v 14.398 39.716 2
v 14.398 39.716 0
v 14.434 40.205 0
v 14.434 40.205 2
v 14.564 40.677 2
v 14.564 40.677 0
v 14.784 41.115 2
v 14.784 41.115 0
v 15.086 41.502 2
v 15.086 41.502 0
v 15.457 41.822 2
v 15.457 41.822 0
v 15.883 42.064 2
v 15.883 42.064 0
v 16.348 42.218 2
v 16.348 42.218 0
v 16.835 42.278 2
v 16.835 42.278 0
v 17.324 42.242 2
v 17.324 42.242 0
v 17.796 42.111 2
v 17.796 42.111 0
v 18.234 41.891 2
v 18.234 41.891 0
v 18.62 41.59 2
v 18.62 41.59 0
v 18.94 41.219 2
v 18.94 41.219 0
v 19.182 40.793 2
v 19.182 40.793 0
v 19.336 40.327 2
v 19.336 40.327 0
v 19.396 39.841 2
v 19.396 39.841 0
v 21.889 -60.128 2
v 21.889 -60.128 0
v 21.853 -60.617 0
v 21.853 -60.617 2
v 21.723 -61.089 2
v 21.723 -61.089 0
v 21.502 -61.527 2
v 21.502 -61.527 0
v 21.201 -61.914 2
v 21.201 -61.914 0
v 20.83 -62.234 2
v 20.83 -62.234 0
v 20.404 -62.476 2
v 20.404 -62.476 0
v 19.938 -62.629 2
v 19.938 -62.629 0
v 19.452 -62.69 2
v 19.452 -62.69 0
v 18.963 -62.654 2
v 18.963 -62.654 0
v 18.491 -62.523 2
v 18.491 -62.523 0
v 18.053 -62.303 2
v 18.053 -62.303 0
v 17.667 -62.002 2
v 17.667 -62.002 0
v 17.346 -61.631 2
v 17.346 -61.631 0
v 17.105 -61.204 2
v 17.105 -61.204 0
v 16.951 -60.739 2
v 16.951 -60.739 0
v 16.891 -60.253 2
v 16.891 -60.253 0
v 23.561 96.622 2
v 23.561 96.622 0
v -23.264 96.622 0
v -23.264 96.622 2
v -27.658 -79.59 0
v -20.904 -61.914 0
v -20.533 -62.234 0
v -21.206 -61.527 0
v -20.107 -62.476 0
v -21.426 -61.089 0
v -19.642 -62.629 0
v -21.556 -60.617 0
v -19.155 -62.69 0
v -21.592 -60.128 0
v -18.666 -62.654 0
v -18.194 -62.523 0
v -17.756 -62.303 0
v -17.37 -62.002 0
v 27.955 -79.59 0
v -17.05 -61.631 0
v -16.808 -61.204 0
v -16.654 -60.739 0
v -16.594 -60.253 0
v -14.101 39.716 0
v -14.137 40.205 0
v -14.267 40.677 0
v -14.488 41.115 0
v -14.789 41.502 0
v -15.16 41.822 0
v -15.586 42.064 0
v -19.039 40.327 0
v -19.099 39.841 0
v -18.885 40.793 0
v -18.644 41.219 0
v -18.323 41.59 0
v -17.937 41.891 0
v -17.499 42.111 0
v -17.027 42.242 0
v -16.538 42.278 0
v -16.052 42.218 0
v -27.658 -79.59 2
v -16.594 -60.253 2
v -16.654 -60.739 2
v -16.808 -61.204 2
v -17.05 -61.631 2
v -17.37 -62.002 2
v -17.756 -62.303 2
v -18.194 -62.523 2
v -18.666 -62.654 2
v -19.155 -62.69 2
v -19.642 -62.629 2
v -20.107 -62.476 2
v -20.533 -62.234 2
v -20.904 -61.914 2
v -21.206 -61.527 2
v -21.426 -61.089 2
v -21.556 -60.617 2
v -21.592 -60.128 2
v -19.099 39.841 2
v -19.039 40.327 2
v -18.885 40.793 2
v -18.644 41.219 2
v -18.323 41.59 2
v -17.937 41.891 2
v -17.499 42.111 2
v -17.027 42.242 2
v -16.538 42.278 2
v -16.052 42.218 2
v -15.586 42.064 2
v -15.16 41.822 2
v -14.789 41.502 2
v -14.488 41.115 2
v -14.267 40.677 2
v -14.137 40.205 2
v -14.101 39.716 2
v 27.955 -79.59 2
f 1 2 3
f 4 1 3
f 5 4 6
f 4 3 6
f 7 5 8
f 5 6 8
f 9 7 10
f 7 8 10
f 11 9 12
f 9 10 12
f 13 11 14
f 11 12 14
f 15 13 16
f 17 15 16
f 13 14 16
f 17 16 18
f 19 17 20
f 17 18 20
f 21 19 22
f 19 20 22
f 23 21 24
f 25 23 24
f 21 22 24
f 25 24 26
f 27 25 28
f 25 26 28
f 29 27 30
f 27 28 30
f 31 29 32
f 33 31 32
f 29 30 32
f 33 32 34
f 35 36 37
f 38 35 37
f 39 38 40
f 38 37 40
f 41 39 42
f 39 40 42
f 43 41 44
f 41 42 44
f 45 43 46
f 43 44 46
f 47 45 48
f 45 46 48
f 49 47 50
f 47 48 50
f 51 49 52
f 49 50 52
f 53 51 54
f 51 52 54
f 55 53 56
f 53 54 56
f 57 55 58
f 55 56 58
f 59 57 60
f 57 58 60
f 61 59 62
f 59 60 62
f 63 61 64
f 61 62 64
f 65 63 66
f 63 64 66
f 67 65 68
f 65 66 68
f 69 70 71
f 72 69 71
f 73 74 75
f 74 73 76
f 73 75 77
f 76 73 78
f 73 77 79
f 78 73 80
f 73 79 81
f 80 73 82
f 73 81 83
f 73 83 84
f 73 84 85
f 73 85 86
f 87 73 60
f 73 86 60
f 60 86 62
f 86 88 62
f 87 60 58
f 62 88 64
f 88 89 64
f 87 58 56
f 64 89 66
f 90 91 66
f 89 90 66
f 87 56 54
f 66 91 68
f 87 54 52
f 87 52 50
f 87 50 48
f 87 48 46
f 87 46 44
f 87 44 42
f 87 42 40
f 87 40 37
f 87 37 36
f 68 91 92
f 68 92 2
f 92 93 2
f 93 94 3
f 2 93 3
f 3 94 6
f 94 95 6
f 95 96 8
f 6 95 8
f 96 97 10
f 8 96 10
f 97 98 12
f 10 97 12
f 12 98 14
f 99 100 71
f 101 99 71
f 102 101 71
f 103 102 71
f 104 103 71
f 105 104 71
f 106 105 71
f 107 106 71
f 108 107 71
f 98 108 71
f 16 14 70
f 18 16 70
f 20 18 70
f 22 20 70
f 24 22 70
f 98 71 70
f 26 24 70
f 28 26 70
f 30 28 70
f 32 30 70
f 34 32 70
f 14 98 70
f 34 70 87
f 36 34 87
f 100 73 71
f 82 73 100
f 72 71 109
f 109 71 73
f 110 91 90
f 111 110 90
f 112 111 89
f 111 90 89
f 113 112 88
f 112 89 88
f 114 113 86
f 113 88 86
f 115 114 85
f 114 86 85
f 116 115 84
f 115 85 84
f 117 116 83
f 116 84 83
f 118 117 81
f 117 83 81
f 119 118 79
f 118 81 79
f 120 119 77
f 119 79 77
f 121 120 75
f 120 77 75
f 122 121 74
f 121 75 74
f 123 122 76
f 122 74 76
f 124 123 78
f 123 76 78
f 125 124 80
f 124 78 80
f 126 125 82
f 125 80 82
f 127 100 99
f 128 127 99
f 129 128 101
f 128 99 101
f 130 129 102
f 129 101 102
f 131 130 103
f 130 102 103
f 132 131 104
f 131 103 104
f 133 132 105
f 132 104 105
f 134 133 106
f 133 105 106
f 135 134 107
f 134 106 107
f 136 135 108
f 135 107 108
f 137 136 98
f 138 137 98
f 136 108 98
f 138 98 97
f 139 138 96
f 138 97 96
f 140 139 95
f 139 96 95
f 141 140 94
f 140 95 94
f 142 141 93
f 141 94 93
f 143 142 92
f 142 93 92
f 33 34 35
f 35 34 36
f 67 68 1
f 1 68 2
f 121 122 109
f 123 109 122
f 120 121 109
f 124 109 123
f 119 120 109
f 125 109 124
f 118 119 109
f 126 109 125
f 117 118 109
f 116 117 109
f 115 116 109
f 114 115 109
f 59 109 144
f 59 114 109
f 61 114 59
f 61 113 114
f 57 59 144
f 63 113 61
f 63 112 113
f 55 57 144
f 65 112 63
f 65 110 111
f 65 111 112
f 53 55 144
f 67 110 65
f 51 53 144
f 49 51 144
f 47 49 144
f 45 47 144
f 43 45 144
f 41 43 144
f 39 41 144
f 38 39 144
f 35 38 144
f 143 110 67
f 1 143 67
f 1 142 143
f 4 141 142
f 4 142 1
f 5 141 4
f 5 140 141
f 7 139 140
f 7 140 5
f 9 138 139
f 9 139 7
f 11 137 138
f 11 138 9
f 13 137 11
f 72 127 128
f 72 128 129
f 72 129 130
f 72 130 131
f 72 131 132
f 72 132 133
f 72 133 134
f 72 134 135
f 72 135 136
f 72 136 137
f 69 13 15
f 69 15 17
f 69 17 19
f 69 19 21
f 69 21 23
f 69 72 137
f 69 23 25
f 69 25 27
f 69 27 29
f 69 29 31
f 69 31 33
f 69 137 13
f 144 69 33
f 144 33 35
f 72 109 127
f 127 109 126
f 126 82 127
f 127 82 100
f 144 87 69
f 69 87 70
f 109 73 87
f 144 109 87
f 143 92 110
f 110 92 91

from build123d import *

# Parameters (mm, degrees)
F1_DEPTH = 2


with BuildPart() as f1:
    # F0 (on Top) → F1 (new body)
    with BuildSketch(Plane.XY):
        Polygon((27.954835, -79.590207), (23.561089, 96.622099), (-23.264273, 96.622099), (-27.658019, -79.590207), align=None)
        with BuildLine():
            Line((-21.592149, -60.128083), (-19.099485, 39.840846))
            ThreePointArc((-19.099485, 39.840846), (-16.537945, 42.277752), (-14.101039, 39.716212))
            Line((-14.101039, 39.716212), (-16.593702, -60.252716))
            ThreePointArc((-16.593702, -60.252716), (-19.155242, -62.689622), (-21.592149, -60.128083))
        make_face(mode=Mode.SUBTRACT)
        with BuildLine():
            ThreePointArc((14.397855, 39.716212), (16.834762, 42.277752), (19.396301, 39.840846))
            Line((19.396301, 39.840846), (21.888965, -60.128083))
            ThreePointArc((21.888965, -60.128083), (19.452058, -62.689622), (16.890518, -60.252716))
            Line((16.890518, -60.252716), (14.397855, 39.716212))
        make_face(mode=Mode.SUBTRACT)
    extrude(amount=F1_DEPTH)


solid = f1.part
